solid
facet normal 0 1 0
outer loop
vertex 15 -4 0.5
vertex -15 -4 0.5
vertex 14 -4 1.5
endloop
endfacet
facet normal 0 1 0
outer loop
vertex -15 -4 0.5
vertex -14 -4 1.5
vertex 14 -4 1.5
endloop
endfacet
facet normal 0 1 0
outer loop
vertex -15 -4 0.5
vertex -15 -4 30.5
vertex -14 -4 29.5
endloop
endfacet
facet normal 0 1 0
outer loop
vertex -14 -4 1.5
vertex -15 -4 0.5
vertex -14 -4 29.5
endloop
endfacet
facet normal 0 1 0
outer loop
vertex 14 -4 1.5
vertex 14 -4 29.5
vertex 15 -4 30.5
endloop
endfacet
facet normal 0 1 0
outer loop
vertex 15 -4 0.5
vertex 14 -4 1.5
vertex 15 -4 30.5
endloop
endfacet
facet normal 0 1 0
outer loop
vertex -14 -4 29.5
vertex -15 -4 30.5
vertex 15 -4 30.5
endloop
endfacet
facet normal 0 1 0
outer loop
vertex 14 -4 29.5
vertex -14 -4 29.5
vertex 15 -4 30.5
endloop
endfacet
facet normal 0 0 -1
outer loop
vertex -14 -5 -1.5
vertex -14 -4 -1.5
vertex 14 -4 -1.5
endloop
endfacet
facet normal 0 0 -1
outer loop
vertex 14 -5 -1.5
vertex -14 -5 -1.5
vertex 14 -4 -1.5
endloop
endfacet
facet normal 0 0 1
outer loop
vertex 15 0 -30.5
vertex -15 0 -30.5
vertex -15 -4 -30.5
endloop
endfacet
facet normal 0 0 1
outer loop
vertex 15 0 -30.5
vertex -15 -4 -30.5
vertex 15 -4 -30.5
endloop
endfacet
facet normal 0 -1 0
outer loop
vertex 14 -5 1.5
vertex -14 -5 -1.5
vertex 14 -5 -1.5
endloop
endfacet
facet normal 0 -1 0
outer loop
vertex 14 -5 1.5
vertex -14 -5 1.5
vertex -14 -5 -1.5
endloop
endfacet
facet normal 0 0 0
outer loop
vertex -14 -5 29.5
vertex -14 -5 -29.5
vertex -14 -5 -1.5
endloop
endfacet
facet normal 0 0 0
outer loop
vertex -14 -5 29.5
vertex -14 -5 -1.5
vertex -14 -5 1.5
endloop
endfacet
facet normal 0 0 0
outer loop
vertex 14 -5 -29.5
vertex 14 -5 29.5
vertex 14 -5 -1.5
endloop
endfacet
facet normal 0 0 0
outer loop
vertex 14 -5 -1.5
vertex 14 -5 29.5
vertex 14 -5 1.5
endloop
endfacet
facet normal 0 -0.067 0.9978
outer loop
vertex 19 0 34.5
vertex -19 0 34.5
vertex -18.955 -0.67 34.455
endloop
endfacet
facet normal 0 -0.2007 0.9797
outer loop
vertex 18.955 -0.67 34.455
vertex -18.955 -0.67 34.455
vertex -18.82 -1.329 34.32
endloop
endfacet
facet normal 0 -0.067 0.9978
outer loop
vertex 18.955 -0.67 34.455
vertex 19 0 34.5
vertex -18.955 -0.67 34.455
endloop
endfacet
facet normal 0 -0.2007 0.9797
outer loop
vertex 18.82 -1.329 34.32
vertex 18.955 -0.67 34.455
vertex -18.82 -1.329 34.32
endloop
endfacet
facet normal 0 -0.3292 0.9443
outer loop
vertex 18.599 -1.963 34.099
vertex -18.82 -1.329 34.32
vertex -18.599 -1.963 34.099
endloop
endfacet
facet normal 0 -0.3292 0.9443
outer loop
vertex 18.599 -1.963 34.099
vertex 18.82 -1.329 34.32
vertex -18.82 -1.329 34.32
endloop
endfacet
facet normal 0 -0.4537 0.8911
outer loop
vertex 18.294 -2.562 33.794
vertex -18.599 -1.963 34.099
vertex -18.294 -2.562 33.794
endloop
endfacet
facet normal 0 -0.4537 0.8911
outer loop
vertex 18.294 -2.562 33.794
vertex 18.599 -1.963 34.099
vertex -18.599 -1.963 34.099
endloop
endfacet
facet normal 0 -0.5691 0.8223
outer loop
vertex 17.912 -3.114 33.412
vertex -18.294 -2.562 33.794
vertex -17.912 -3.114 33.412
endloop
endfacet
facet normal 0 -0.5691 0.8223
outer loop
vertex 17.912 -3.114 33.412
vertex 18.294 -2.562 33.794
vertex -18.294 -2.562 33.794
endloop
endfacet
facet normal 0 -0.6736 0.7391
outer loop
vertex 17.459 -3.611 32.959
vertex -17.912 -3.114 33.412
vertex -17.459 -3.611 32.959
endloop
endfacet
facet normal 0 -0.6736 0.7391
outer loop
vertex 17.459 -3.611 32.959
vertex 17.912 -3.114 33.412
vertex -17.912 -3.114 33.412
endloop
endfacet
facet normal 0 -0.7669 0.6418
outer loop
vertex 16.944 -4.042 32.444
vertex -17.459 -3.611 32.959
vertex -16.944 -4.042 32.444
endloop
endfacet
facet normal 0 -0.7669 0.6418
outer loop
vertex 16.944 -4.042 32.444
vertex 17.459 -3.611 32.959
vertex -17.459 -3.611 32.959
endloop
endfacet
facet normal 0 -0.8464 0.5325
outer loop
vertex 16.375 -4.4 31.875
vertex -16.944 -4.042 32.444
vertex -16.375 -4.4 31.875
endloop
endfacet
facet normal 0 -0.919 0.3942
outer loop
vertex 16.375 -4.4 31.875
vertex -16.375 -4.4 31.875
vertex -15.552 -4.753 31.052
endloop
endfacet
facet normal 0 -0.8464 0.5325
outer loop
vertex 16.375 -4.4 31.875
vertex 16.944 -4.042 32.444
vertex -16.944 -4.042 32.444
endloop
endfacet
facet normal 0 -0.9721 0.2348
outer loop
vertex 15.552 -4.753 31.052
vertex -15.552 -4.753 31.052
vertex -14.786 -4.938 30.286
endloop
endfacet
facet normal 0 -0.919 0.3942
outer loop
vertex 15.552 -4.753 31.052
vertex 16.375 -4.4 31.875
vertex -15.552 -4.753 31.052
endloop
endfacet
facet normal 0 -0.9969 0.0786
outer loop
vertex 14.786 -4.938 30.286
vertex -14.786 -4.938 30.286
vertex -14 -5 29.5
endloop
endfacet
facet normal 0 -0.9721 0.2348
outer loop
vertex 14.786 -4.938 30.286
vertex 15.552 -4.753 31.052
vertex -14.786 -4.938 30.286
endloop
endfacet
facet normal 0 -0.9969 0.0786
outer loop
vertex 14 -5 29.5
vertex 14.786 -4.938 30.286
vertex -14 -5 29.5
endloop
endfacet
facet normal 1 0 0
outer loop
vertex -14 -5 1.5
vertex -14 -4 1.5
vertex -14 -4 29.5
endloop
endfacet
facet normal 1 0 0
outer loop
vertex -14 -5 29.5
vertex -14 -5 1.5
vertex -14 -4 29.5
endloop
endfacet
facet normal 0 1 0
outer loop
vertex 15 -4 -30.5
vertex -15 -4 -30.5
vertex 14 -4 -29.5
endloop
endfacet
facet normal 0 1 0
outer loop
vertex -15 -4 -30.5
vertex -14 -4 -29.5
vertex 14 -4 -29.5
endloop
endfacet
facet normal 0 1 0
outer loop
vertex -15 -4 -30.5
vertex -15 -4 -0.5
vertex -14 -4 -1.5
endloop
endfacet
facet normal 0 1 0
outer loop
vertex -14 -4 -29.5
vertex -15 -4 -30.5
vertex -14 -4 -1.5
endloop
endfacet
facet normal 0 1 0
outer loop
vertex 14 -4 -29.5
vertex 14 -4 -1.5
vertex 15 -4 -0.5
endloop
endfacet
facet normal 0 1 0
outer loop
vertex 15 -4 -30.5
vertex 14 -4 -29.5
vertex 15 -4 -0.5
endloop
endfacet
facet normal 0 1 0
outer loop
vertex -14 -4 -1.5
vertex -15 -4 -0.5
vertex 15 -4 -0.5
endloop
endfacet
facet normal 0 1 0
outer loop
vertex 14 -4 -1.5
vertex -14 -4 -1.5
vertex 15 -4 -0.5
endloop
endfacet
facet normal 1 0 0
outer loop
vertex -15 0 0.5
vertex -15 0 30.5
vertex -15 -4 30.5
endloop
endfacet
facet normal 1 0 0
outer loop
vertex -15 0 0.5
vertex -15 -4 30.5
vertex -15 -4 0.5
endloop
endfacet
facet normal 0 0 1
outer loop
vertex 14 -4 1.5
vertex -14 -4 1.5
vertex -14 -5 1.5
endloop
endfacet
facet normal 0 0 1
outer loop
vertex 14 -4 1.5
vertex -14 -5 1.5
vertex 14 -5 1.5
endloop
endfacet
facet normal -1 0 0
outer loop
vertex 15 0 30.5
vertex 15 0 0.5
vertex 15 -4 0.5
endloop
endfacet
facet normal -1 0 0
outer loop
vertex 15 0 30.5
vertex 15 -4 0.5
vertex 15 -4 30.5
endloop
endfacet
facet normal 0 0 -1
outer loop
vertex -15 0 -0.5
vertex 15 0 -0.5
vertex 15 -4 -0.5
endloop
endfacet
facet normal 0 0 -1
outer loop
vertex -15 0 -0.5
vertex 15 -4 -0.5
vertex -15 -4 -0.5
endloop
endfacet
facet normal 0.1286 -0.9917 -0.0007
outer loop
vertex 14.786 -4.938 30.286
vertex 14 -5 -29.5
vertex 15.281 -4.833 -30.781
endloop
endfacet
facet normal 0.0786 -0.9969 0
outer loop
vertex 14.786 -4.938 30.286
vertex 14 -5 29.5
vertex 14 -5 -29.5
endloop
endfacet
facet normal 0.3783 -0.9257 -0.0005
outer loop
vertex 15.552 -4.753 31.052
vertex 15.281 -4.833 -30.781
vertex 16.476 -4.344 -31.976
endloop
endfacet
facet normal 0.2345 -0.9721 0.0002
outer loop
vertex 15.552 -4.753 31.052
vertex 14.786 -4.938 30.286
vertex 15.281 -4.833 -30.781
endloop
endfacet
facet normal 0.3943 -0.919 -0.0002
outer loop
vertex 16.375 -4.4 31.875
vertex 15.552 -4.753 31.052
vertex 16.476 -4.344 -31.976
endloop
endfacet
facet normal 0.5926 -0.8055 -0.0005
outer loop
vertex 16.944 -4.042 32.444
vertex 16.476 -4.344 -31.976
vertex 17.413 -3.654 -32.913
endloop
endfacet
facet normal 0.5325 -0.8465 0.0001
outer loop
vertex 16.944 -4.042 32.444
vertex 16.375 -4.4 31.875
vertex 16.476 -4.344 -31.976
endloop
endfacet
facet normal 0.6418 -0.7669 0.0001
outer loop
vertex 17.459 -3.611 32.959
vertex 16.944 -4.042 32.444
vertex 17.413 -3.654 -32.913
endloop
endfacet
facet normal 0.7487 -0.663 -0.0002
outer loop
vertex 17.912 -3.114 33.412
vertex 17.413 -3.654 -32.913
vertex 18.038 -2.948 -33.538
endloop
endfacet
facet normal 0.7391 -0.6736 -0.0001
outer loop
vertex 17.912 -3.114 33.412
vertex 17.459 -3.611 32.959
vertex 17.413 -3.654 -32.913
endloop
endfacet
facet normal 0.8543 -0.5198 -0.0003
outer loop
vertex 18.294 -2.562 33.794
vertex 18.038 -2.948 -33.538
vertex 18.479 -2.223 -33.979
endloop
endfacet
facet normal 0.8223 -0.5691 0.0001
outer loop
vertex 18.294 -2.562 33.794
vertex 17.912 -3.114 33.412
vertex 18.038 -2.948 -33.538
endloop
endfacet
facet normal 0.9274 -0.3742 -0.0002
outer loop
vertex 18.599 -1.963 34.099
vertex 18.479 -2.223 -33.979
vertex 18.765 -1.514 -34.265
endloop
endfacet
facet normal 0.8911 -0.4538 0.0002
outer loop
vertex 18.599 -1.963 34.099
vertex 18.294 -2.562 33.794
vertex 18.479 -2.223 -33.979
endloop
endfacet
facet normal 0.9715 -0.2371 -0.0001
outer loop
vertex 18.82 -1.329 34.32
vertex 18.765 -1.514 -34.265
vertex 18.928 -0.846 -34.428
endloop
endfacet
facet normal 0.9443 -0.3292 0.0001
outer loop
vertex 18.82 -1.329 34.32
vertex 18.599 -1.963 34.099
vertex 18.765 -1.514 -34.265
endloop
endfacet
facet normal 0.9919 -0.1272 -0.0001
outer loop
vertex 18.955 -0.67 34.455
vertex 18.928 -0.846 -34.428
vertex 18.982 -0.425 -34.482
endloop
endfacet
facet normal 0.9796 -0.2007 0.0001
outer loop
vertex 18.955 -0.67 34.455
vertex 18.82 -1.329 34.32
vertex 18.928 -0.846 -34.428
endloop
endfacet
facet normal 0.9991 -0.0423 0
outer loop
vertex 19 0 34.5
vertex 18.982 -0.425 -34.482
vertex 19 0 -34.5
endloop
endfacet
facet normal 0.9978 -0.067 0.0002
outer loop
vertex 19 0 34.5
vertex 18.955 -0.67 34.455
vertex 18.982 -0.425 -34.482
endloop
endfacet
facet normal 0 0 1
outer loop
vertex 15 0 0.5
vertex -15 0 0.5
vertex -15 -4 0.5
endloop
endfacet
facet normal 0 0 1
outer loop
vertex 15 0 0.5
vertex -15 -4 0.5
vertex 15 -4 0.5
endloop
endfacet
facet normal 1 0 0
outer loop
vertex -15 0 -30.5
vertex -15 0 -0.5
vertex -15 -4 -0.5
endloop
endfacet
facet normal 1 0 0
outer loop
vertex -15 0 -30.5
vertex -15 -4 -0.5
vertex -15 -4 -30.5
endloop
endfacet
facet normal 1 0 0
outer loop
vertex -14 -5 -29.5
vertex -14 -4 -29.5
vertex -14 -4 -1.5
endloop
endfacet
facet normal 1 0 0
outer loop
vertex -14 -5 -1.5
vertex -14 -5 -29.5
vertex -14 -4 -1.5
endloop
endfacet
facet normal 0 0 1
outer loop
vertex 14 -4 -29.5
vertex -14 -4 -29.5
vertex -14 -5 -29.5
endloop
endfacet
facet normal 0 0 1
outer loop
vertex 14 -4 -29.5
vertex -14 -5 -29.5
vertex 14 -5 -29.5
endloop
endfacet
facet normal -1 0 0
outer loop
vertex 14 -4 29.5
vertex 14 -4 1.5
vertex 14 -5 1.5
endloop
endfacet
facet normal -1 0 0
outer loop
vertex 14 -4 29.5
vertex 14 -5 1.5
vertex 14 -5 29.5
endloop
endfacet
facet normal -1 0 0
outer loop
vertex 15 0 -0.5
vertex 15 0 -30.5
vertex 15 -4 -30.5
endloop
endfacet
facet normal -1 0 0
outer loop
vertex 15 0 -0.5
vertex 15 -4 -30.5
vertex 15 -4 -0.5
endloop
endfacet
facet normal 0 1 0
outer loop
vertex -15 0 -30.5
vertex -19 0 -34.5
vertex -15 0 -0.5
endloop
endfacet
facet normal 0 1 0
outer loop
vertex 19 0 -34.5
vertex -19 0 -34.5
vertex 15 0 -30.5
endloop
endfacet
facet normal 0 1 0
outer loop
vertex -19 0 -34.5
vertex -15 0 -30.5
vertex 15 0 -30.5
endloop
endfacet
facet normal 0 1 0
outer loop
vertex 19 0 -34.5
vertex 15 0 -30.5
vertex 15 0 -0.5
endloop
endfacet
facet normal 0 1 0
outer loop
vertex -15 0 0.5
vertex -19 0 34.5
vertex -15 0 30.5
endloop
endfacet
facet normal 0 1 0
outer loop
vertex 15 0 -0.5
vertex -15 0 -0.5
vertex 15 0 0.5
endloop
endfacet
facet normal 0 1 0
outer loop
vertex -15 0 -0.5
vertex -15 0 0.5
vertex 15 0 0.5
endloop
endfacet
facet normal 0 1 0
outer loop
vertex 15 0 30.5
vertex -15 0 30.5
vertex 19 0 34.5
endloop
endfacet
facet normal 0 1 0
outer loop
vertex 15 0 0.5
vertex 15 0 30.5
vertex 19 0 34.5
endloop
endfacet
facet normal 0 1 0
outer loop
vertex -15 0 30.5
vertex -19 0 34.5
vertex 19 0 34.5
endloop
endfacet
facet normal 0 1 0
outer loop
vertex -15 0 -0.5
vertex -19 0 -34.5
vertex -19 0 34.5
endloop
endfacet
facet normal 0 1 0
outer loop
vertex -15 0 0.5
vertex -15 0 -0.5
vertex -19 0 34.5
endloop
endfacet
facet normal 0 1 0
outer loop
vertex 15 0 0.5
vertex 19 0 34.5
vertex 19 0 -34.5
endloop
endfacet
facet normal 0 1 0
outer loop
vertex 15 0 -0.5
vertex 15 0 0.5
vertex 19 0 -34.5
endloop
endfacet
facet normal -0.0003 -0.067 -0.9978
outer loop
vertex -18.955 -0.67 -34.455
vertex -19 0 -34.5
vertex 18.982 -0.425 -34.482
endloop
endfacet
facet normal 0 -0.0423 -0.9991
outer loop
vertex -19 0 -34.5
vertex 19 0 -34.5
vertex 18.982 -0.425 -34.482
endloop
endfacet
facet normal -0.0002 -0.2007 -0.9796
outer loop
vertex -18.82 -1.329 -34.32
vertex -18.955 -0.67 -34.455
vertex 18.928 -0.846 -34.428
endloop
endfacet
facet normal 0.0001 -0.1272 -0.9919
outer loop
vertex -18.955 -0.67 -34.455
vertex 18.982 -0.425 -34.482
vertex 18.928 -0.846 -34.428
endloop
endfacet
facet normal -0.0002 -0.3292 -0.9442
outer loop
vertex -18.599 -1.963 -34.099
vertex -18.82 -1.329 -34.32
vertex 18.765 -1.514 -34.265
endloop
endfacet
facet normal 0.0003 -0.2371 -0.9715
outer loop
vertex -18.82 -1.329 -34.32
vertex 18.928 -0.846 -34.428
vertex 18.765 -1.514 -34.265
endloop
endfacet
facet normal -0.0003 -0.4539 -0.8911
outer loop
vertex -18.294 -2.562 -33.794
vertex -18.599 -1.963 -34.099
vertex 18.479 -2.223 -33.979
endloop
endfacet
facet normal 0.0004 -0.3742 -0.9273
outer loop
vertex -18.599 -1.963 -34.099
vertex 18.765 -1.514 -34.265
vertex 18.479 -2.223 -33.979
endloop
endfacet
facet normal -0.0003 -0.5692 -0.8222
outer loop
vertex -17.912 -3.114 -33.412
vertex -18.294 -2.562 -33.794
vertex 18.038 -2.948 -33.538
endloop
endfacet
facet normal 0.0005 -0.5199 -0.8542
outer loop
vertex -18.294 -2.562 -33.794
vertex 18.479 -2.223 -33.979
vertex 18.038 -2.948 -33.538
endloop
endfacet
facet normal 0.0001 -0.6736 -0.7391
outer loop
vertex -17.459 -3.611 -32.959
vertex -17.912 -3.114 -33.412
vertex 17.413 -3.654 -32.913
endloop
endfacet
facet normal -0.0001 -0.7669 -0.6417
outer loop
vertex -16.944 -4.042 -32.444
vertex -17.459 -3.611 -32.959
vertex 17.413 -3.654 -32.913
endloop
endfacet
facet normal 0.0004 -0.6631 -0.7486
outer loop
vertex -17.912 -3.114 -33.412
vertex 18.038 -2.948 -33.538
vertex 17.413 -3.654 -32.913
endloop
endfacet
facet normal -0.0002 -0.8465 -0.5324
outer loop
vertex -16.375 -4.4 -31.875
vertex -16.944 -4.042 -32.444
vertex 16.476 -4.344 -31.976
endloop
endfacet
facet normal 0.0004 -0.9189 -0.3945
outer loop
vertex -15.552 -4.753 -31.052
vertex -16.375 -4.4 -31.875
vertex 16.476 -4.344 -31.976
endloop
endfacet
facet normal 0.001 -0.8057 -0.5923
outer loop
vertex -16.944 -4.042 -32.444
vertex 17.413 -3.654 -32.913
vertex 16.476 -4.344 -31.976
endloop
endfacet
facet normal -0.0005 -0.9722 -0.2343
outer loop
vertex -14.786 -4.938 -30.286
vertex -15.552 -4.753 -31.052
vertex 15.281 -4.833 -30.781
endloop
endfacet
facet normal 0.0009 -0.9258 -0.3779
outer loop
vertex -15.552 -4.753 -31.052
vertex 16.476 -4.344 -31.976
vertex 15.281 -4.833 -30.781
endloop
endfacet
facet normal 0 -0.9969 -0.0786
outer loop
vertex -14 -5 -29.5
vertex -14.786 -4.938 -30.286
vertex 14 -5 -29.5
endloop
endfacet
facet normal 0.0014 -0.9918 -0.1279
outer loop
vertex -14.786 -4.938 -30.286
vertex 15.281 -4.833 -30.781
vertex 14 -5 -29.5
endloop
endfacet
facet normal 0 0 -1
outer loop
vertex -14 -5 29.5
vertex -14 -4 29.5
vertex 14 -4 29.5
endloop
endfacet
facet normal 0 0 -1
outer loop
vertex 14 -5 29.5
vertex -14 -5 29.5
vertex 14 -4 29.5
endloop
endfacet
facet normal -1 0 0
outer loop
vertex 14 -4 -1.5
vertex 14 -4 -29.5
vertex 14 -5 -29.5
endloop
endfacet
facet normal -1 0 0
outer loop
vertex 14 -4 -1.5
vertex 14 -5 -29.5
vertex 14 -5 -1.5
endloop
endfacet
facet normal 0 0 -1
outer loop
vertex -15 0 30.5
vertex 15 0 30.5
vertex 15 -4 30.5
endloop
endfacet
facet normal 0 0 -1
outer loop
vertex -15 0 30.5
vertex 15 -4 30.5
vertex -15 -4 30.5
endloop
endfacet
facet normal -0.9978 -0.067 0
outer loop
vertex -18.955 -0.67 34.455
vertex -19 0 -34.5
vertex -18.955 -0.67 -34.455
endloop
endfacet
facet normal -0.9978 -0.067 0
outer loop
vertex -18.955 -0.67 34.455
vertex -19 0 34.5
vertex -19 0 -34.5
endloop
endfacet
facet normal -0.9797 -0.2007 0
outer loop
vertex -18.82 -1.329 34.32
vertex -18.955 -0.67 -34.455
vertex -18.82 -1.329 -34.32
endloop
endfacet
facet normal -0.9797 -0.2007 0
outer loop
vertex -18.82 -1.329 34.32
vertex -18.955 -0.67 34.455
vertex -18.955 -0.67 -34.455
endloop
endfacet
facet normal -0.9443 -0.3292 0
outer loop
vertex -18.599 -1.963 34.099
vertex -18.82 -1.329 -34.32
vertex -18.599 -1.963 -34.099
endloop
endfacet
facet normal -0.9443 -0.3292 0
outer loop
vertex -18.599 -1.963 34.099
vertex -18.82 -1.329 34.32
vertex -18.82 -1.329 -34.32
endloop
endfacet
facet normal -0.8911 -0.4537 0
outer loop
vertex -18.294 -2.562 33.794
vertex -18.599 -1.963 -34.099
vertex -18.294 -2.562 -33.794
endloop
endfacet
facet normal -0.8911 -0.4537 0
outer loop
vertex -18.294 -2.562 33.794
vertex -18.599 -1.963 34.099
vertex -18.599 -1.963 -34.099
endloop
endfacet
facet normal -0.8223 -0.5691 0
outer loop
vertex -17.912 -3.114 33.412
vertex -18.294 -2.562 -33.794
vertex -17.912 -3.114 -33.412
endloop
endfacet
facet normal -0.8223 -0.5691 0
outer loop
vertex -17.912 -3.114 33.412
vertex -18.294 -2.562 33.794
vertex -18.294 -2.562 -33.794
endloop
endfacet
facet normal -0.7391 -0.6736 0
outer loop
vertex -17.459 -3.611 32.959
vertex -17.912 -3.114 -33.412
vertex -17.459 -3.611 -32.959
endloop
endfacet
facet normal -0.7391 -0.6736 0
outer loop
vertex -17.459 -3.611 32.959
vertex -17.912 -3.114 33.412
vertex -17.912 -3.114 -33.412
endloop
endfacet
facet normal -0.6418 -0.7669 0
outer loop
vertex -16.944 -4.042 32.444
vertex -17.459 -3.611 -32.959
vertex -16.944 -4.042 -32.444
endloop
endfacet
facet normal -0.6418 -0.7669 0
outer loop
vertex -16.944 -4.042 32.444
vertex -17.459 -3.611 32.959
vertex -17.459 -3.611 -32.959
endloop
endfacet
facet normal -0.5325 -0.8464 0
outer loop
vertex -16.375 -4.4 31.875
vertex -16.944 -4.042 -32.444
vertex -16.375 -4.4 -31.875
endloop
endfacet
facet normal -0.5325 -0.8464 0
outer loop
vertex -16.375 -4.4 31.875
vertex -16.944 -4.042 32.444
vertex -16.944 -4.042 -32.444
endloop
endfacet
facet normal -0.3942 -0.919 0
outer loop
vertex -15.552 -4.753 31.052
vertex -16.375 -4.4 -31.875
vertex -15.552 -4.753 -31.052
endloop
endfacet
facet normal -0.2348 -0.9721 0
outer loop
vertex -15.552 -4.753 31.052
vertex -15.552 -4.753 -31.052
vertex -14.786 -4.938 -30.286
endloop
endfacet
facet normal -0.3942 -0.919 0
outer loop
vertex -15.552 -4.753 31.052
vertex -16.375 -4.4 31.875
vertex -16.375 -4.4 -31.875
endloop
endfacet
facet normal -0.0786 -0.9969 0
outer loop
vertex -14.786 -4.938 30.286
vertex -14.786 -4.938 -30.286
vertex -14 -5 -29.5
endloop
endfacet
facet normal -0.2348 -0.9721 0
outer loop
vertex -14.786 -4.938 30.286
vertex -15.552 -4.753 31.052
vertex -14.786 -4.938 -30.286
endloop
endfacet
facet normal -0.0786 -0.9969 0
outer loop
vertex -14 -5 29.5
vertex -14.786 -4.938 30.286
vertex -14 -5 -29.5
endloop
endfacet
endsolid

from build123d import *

# Parameters (mm, degrees)
F0_W     = 38
F0_H     = 69
F0_W_2   = 28
F0_H_2   = 28
F0_H_3   = 1
F0_W_3   = 1
F1_DEPTH = 5
F2_DEPTH = 25
F3_DEPTH = 4
F4_R     = 4.99999


# Not quite as in the source:
# - a fillet or chamfer is up to 0.001 mm smaller than in the source, because OpenCascade refuses the exact size


with BuildPart() as f1:
    # F0 (on Front) → F1 (new body)
    with BuildSketch(Plane.XZ):
        Rectangle(F0_W, F0_H)
        Polygon((-15, 0.5), (-15, 1.5), (-15, 30.5), (15, 30.5), (15, 1.5), (15, 0.5), (15, -0.5), (15, -1.5), (15, -30.5), (-15, -30.5), (-15, -1.5), (-15, -0.5), align=None, mode=Mode.SUBTRACT)
        with Locations((0, 15.5)):
            Rectangle(F0_W_2, F0_H_2)
        with Locations((0, -15.5)):
            Rectangle(F0_W_2, F0_H_2)
        Polygon((-14, -29.5), (-14, -1.5), (-15, -1.5), (-15, -30.5), (15, -30.5), (15, -1.5), (14, -1.5), (14, -29.5), align=None)
        Polygon((-14, 1.5), (-14, 29.5), (14, 29.5), (14, 1.5), (15, 1.5), (15, 30.5), (-15, 30.5), (-15, 1.5), align=None)
        with Locations((0, 1)):
            Rectangle(F0_W_2, F0_H_3)
        with Locations((0, -1)):
            Rectangle(F0_W_2, F0_H_3)
        Rectangle(F0_W_2, F0_H_3)
        with Locations((-14.5, 1)):
            Rectangle(F0_W_3, F0_H_3)
        with Locations((-14.5, 0)):
            Rectangle(F0_W_3, F0_H_3)
        with Locations((-14.5, -1)):
            Rectangle(F0_W_3, F0_H_3)
        with Locations((14.5, 1)):
            Rectangle(F0_W_3, F0_H_3)
        with Locations((14.5, 0)):
            Rectangle(F0_W_3, F0_H_3)
        with Locations((14.5, -1)):
            Rectangle(F0_W_3, F0_H_3)
    extrude(amount=F1_DEPTH)

    # F0 (on Front) → F2 (cut)
    with BuildSketch(Plane.XZ):
        with Locations((0, 15.5)):
            Rectangle(F0_W_2, F0_H_2)
        with Locations((0, -15.5)):
            Rectangle(F0_W_2, F0_H_2)
    extrude(amount=F2_DEPTH, mode=Mode.SUBTRACT)

    # F0 (on Front) → F3 (cut)
    with BuildSketch(Plane.XZ):
        Polygon((-14, 1.5), (-14, 29.5), (14, 29.5), (14, 1.5), (15, 1.5), (15, 30.5), (-15, 30.5), (-15, 1.5), align=None)
        with Locations((14.5, 1)):
            Rectangle(F0_W_3, F0_H_3)
        with Locations((0, 1)):
            Rectangle(F0_W_2, F0_H_3)
        with Locations((-14.5, 1)):
            Rectangle(F0_W_3, F0_H_3)
        Polygon((-14, -29.5), (-14, -1.5), (-15, -1.5), (-15, -30.5), (15, -30.5), (15, -1.5), (14, -1.5), (14, -29.5), align=None)
        with Locations((14.5, -1)):
            Rectangle(F0_W_3, F0_H_3)
        with Locations((0, -1)):
            Rectangle(F0_W_2, F0_H_3)
        with Locations((-14.5, -1)):
            Rectangle(F0_W_3, F0_H_3)
    extrude(amount=F3_DEPTH, mode=Mode.SUBTRACT)

    # F4 (radius 5 in the source; OpenCascade refuses exactly that, so slightly less here)
    f4_edges = [f1.edges().sort_by_distance(p)[0] for p in [
        (-19, -5, 0),
        (0, -5, 34.5),
        (19, -5, 0),
        (0, -5, -34.5),
    ]]
    fillet(f4_edges, radius=F4_R)


solid = f1.part
